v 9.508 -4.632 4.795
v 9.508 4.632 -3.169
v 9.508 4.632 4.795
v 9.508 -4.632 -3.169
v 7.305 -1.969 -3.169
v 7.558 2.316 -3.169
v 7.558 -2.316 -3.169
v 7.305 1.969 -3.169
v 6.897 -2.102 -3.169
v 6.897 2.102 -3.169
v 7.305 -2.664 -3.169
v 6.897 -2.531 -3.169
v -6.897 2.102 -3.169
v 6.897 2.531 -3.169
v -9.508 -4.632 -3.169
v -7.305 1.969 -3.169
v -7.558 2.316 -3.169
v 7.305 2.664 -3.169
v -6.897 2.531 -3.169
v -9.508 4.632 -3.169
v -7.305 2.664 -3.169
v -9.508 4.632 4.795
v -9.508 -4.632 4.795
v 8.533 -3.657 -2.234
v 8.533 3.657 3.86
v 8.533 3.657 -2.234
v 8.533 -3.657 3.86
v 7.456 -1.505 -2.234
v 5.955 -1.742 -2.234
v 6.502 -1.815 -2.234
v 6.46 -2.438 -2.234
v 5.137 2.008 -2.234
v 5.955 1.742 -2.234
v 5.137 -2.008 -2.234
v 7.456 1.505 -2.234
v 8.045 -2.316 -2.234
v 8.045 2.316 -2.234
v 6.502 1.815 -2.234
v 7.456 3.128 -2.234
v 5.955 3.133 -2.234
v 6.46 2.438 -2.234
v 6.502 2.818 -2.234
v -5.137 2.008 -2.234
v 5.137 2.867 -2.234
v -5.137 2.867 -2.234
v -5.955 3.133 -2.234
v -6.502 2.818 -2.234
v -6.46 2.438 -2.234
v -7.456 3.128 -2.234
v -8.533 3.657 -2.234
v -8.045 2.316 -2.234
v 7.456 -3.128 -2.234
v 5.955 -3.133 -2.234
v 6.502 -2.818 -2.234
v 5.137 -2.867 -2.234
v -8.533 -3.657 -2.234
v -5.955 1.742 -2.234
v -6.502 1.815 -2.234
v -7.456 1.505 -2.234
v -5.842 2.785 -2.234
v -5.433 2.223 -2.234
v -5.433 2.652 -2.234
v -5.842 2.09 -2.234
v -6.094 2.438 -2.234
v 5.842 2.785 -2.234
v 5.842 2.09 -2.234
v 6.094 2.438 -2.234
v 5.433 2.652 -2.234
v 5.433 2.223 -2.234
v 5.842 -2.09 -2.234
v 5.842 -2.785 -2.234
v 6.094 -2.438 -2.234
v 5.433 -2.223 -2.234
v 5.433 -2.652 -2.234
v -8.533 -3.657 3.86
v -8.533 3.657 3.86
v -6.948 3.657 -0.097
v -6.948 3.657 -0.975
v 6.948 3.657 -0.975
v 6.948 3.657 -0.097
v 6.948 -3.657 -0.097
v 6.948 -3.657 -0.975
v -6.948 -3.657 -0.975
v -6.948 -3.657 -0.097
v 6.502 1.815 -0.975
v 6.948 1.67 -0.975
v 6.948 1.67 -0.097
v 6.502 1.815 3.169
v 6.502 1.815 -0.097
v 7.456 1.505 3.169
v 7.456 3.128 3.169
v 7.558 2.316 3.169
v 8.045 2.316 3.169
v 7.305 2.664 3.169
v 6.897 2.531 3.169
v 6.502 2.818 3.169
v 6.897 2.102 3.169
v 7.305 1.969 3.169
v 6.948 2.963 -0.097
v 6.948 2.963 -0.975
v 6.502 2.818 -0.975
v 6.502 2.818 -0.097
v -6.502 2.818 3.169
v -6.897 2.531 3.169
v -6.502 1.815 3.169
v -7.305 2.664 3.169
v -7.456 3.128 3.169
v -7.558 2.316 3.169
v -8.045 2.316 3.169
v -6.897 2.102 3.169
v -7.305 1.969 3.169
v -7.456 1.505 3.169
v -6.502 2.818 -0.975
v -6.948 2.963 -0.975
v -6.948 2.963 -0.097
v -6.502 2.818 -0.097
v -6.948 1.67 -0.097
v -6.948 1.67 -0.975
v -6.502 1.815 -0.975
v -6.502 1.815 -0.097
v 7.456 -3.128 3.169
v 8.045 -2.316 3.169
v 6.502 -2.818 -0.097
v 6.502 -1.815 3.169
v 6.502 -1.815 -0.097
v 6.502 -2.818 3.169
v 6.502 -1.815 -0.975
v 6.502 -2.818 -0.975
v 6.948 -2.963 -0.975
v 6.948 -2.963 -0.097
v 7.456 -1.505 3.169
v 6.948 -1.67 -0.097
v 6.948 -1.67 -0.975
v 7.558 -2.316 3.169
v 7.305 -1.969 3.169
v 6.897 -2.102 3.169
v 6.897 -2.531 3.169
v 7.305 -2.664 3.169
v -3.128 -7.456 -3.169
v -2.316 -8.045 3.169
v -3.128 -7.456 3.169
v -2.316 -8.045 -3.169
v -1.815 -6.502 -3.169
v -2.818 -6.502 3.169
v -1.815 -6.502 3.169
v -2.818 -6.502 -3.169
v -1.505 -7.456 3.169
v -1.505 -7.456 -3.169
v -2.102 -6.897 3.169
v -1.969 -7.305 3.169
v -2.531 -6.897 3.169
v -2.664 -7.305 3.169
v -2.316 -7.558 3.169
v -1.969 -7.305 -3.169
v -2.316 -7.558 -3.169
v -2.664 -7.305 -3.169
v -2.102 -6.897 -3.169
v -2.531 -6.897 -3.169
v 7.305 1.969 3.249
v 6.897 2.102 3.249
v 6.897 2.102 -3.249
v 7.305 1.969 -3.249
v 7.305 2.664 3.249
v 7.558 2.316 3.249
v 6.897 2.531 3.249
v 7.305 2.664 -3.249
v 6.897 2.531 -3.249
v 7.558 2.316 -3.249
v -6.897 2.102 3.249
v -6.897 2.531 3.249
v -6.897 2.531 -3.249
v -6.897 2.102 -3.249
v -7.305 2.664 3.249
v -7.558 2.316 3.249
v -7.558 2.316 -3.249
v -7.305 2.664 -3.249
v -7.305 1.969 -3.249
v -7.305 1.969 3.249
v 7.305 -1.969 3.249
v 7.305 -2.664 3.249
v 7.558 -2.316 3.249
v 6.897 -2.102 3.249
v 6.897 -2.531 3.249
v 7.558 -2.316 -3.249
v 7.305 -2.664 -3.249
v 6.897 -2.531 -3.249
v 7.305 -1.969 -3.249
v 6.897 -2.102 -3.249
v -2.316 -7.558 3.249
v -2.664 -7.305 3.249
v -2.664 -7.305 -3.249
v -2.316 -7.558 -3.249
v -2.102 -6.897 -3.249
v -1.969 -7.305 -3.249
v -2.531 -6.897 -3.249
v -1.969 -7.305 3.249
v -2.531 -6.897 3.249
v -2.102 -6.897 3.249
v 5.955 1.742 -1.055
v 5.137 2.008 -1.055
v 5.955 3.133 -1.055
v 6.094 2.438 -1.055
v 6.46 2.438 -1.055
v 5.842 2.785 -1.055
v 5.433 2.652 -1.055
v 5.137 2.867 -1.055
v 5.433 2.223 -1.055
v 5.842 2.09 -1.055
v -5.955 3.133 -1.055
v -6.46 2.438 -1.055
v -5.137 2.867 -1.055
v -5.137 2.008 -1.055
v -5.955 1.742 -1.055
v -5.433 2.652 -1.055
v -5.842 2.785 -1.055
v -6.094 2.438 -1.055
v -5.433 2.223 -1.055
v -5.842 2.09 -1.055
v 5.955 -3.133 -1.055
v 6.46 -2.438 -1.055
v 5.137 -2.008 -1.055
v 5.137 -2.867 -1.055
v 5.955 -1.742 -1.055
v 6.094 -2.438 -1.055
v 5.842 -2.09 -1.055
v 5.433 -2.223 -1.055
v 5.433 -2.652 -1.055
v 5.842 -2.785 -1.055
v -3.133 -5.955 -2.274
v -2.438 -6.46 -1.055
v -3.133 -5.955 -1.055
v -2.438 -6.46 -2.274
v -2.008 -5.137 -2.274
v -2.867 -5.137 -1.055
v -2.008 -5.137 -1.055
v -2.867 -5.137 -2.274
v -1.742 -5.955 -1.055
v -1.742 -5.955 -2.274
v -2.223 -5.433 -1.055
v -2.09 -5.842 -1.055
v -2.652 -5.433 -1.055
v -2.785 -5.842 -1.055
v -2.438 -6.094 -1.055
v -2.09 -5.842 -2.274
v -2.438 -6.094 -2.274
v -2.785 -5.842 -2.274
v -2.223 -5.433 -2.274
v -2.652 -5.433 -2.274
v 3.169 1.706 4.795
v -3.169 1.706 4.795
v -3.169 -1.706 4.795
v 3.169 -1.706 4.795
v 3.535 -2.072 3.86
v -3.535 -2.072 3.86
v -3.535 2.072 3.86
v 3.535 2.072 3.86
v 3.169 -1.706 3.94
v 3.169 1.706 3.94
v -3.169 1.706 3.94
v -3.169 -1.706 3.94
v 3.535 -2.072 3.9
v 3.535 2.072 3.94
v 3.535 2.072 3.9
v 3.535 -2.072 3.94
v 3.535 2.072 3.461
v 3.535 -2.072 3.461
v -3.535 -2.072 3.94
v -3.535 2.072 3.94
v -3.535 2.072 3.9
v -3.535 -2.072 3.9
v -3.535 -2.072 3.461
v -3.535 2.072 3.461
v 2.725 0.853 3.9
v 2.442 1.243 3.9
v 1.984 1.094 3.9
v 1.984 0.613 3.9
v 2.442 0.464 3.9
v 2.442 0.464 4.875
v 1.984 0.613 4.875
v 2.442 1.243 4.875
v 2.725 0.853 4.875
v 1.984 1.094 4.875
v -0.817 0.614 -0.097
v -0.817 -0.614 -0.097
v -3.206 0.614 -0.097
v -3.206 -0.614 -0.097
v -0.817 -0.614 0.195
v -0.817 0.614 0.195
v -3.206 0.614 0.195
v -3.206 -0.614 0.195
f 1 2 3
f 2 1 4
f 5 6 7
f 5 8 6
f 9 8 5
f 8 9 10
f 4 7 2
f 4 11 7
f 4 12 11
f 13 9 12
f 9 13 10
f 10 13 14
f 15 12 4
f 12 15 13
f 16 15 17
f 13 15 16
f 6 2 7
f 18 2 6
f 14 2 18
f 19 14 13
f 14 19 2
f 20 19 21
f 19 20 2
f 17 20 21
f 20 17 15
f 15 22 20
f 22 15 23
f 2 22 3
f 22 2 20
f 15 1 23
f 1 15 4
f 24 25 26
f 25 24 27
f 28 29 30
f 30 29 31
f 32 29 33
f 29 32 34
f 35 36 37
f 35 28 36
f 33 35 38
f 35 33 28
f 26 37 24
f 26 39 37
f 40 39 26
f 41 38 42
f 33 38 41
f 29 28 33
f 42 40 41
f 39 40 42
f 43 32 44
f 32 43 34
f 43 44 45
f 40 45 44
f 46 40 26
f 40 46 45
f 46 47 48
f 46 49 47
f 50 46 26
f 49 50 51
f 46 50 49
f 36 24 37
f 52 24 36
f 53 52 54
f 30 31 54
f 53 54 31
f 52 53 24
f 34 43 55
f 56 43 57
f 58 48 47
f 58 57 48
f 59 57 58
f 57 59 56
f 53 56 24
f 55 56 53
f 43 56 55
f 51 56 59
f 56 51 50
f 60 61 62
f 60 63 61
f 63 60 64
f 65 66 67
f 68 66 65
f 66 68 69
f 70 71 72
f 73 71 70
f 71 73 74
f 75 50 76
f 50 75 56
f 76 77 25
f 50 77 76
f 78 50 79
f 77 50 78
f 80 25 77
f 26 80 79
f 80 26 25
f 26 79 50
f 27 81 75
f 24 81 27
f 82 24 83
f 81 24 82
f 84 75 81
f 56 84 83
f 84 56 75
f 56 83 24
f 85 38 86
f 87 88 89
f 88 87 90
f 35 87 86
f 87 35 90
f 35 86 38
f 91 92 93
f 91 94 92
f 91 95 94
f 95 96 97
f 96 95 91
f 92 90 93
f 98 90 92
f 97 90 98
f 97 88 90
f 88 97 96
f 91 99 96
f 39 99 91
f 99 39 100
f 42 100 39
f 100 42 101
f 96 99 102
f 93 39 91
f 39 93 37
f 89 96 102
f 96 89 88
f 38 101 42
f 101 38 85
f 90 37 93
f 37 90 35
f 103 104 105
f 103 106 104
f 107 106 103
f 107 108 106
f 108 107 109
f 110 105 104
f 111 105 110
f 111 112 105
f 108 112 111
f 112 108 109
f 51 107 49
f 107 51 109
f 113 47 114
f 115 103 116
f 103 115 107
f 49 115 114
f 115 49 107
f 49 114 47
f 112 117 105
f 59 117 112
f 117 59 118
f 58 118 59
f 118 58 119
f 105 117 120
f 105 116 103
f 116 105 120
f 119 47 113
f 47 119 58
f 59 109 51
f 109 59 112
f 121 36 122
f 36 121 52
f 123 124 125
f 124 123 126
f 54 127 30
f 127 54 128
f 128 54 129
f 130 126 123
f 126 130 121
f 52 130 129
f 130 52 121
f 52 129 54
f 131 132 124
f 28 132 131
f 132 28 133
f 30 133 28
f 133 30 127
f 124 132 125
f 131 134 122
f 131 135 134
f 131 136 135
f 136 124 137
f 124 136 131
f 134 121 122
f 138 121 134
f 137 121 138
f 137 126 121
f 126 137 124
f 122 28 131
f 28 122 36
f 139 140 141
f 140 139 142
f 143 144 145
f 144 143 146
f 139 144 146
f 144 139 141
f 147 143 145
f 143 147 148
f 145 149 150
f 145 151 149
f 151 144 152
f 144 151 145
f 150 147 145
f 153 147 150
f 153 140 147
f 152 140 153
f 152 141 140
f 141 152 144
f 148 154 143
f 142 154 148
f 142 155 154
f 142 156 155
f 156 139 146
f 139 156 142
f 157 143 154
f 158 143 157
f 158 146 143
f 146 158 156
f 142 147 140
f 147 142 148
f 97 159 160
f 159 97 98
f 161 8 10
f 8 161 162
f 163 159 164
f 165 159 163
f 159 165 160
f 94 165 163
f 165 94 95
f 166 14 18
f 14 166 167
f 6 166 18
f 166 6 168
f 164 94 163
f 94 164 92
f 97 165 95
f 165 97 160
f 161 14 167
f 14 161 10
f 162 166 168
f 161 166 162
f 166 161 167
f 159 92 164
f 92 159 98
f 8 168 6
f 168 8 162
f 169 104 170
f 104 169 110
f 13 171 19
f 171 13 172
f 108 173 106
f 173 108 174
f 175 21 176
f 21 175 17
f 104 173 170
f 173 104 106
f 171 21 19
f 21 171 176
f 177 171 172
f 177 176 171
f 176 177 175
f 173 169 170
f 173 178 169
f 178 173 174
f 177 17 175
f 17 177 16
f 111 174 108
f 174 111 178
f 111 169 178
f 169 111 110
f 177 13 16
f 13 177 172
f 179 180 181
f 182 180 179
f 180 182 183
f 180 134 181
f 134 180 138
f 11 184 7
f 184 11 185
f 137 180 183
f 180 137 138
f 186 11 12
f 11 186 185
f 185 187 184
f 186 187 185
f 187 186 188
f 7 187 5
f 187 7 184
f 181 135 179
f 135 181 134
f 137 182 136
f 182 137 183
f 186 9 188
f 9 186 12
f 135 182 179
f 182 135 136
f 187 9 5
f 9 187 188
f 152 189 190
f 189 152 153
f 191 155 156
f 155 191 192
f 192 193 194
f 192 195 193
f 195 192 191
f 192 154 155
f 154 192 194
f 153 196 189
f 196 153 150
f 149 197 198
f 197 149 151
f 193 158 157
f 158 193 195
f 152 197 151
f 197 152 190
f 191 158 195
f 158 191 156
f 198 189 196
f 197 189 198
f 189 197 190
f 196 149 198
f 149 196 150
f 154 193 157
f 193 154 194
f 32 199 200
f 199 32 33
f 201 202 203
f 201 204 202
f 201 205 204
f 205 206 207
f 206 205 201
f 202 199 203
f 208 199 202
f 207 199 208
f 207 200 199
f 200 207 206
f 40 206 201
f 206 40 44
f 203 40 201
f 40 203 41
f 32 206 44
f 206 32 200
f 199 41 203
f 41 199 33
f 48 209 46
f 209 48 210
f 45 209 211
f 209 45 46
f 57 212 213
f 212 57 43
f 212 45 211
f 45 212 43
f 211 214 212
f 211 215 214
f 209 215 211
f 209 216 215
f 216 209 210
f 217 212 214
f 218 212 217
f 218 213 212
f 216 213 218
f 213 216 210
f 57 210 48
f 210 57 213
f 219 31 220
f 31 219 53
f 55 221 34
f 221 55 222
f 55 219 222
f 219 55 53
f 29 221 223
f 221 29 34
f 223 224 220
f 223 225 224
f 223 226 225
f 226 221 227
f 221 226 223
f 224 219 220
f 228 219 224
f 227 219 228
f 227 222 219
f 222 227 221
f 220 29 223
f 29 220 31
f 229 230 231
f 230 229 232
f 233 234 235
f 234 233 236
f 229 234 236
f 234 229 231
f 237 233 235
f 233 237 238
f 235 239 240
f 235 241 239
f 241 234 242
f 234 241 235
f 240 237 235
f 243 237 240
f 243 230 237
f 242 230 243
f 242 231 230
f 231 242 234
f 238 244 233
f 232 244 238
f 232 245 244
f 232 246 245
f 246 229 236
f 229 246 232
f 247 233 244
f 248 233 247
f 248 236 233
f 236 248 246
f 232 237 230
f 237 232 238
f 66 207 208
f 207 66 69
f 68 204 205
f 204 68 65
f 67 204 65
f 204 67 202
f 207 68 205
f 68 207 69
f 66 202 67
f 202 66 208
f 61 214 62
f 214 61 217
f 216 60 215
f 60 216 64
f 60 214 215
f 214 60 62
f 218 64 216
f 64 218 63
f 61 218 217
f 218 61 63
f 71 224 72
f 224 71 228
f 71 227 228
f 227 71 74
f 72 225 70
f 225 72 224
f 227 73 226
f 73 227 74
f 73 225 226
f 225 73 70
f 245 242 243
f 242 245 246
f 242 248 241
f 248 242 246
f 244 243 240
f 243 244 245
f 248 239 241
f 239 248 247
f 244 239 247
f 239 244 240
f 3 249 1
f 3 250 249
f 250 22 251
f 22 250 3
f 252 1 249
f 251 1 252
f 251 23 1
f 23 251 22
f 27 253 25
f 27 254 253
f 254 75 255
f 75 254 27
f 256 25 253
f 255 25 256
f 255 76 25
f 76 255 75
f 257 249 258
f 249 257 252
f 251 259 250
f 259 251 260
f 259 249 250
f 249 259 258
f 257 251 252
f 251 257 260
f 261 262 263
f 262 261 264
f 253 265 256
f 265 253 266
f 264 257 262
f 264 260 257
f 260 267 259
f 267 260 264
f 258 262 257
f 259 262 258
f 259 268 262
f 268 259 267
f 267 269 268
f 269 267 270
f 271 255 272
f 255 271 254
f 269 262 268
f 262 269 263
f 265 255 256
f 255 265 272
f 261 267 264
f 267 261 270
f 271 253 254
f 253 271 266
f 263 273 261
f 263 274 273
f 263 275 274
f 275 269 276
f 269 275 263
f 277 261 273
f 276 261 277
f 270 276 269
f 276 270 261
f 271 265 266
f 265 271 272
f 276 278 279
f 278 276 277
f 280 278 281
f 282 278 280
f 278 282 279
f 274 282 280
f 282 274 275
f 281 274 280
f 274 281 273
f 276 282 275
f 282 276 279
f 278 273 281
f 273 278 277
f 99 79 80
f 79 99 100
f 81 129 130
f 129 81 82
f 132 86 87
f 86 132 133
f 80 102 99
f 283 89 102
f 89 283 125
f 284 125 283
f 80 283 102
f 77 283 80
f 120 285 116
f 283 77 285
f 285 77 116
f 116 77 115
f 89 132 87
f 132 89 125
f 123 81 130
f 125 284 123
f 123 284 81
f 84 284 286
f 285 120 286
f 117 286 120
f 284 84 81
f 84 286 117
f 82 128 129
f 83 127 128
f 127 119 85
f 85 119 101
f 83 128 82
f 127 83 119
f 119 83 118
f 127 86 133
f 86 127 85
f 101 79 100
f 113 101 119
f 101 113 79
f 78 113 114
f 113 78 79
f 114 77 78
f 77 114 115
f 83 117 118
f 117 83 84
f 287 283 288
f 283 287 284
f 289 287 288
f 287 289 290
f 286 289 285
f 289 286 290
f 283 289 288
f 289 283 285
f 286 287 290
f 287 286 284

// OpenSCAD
// Parameters
total_length = 24.384; //[12.192:48.768:0.1]
wall_thickness = 0.975; //[0.5:2.0:0.05]
lid_thickness = 0.975; //[0.5:2.0:0.05]
base_inner_length = 17.066; //[8.5:34.0:0.1]
base_inner_width = 7.314; //[3.5:15.0:0.1]
base_inner_height = 5.363; //[2.5:11.0:0.1]
lid_lip_height = 0.731; //[0.3:1.6:0.05]
lid_lip_clearance = 0.073; //[0.02:0.2:0.01]
print_clearance_general = 0.073; //[0.02:0.2:0.01]
fastener_boss_outer_diameter = 1.706; //[0.9:3.5:0.05]
fastener_hole_diameter = 0.731; //[0.4:1.6:0.05]
standoff_height = 1.219; //[0.6:2.6:0.05]
standoff_outer_diameter = 1.463; //[0.7:3.0:0.05]
standoff_hole_diameter = 0.731; //[0.4:1.6:0.05]
usb_cutout_width = 2.925; //[1.2:6.0:0.05]
usb_cutout_height = 1.463; //[0.6:3.0:0.05]
display_window_width = 6.338; //[3.0:13.0:0.05]
display_window_height = 3.413; //[1.5:7.0:0.05]
display_window_bezel = 0.366; //[0.1:1.0:0.02]
display_pcb_clearance_depth = 0.731; //[0.3:1.6:0.05]
pcb_length = 13.409; //[6.5:27.0:0.1]
pcb_width = 6.826; //[3.0:14.0:0.1]
pcb_thickness = 0.39; //[0.2:1.0:0.01]
pcb_clearance_xy = 0.244; //[0.1:0.6:0.01]
pcb_clearance_z = 0.488; //[0.2:1.2:0.02]
overlap = 0.08; //[0.02:0.2:0.01]

// Base Enclosure
module enclosure_base_outer() {
  cube([base_inner_length + 2*wall_thickness, base_inner_width + 2*wall_thickness, base_inner_height + wall_thickness], center=true);
}

module enclosure_base_inner_void() {
  translate([0, 0, wall_thickness/2])
    cube([base_inner_length, base_inner_width, base_inner_height + overlap], center=true);
}

module fastener_boss_cyl() {
  cylinder(r=fastener_boss_outer_diameter/2, h=base_inner_height + wall_thickness, center=true);
}

module fastener_hole_cyl() {
  cylinder(r=fastener_hole_diameter/2, h=base_inner_height + wall_thickness + 2*overlap, center=true);
}

module standoff_cyl() {
  cylinder(r=standoff_outer_diameter/2, h=standoff_height, center=true);
}

module standoff_hole_cyl() {
  cylinder(r=standoff_hole_diameter/2, h=standoff_height + 2*overlap, center=true);
}

module usb_access_cutout() {
  translate([base_inner_length/2 + wall_thickness/2, 0, -(base_inner_height + wall_thickness)/2 + wall_thickness + usb_cutout_height/2])
    cube([wall_thickness + 2*overlap, usb_cutout_width + 2*print_clearance_general, usb_cutout_height + 2*print_clearance_general], center=true);
}

module side_clearance_cutouts() {
  translate([0, base_inner_width/2 + wall_thickness/2, 0])
    cube([base_inner_length*0.35, wall_thickness + 2*overlap, base_inner_height*0.35], center=true);
}

module internal_board_clearance_volume() {
  translate([0, 0, -(base_inner_height + wall_thickness)/2 + wall_thickness + standoff_height + (pcb_thickness + pcb_clearance_z)/2])
    cube([pcb_length + 2*pcb_clearance_xy, pcb_width + 2*pcb_clearance_xy, pcb_thickness + pcb_clearance_z], center=true);
}

// Lid Enclosure
module enclosure_lid_outer() {
  translate([0, 0, (base_inner_height + wall_thickness)/2 + (lid_thickness + lid_lip_height)/2 - overlap])
    cube([base_inner_length + 2*wall_thickness, base_inner_width + 2*wall_thickness, lid_thickness + lid_lip_height], center=true);
}

module enclosure_lid_underside_void() {
  translate([0, 0, (base_inner_height + wall_thickness)/2 + (lid_thickness + lid_lip_height)/2 - overlap - lid_thickness/2])
    cube([base_inner_length + 2*wall_thickness - 2*wall_thickness, base_inner_width + 2*wall_thickness - 2*wall_thickness, lid_lip_height + overlap], center=true);
}

module lid_lip_solid() {
  translate([0, 0, (base_inner_height + wall_thickness)/2 + lid_lip_height/2 - overlap])
    cube([base_inner_length - 2*lid_lip_clearance, base_inner_width - 2*lid_lip_clearance, lid_lip_height], center=true);
}

module display_window_cutout() {
  translate([0, 0, (base_inner_height + wall_thickness)/2 + (lid_thickness + lid_lip_height) - lid_thickness/2])
    cube([display_window_width, display_window_height, lid_thickness + 2*overlap], center=true);
}

module display_pocket_cutout() {
  translate([0, 0, (base_inner_height + wall_thickness)/2 + lid_lip_height - display_pcb_clearance_depth/2])
    cube([display_window_width + 2*display_window_bezel, display_window_height + 2*display_window_bezel, display_pcb_clearance_depth + overlap], center=true);
}

module display() {
  translate([0, 0, (base_inner_height + wall_thickness)/2 + lid_lip_height - display_pcb_clearance_depth*0.3])
    cube([display_window_width + 2*display_window_bezel, display_window_height + 2*display_window_bezel, display_pcb_clearance_depth*0.6], center=true);
}

module led() {
  translate([display_window_width/2 - display_window_height*0.25, display_window_height/2 - display_window_height*0.25, (base_inner_height + wall_thickness)/2 + (lid_thickness + lid_lip_height) - lid_thickness/2])
    cylinder(r=display_window_height*0.12, h=lid_thickness, center=true);
}

module box_header() {
  translate([-pcb_length*0.15, 0, -(base_inner_height + wall_thickness)/2 + wall_thickness + standoff_height + pcb_thickness + (pcb_thickness*2)/2])
    cube([pcb_width*0.35, pcb_width*0.18, pcb_thickness*2], center=true);
}

// Assembly
module enclosure_assembly() {
  union() {
    // Base
    difference() {
      enclosure_base_outer();
      enclosure_base_inner_void();
    }
    // Fastener Bosses
    union() {
      translate([base_inner_length/2 - fastener_boss_outer_diameter/2 - wall_thickness/2, base_inner_width/2 - fastener_boss_outer_diameter/2 - wall_thickness/2, 0])
        fastener_boss_cyl();
      mirror([1, 0, 0])
        translate([base_inner_length/2 - fastener_boss_outer_diameter/2 - wall_thickness/2, base_inner_width/2 - fastener_boss_outer_diameter/2 - wall_thickness/2, 0])
        fastener_boss_cyl();
      mirror([0, 1, 0])
        translate([base_inner_length/2 - fastener_boss_outer_diameter/2 - wall_thickness/2, base_inner_width/2 - fastener_boss_outer_diameter/2 - wall_thickness/2, 0])
        fastener_boss_cyl();
      mirror([1, 1, 0])
        translate([base_inner_length/2 - fastener_boss_outer_diameter/2 - wall_thickness/2, base_inner_width/2 - fastener_boss_outer_diameter/2 - wall_thickness/2, 0])
        fastener_boss_cyl();
    }
    // Fastener Holes
    difference() {
      union() {
        translate([base_inner_length/2 - fastener_boss_outer_diameter/2 - wall_thickness/2, base_inner_width/2 - fastener_boss_outer_diameter/2 - wall_thickness/2, 0])
          fastener_hole_cyl();
        mirror([1, 0, 0])
          translate([base_inner_length/2 - fastener_boss_outer_diameter/2 - wall_thickness/2, base_inner_width/2 - fastener_boss_outer_diameter/2 - wall_thickness/2, 0])
          fastener_hole_cyl();
        mirror([0, 1, 0])
          translate([base_inner_length/2 - fastener_boss_outer_diameter/2 - wall_thickness/2, base_inner_width/2 - fastener_boss_outer_diameter/2 - wall_thickness/2, 0])
          fastener_hole_cyl();
        mirror([1, 1, 0])
          translate([base_inner_length/2 - fastener_boss_outer_diameter/2 - wall_thickness/2, base_inner_width/2 - fastener_boss_outer_diameter/2 - wall_thickness/2, 0])
          fastener_hole_cyl();
      }
      usb_access_cutout();
      side_clearance_cutouts();
    }
    // PCB Mounting Standoffs
    difference() {
      union() {
        translate([pcb_length/2 - standoff_outer_diameter/2 - pcb_clearance_xy, pcb_width/2 - standoff_outer_diameter/2 - pcb_clearance_xy, -(base_inner_height + wall_thickness)/2 + wall_thickness + standoff_height/2 - overlap])
          standoff_cyl();
        mirror([1, 0, 0])
          translate([pcb_length/2 - standoff_outer_diameter/2 - pcb_clearance_xy, pcb_width/2 - standoff_outer_diameter/2 - pcb_clearance_xy, -(base_inner_height + wall_thickness)/2 + wall_thickness + standoff_height/2 - overlap])
          standoff_cyl();
        mirror([0, 1, 0])
          translate([pcb_length/2 - standoff_outer_diameter/2 - pcb_clearance_xy, pcb_width/2 - standoff_outer_diameter/2 - pcb_clearance_xy, -(base_inner_height + wall_thickness)/2 + wall_thickness + standoff_height/2 - overlap])
          standoff_cyl();
        mirror([1, 1, 0])
          translate([pcb_length/2 - standoff_outer_diameter/2 - pcb_clearance_xy, pcb_width/2 - standoff_outer_diameter/2 - pcb_clearance_xy, -(base_inner_height + wall_thickness)/2 + wall_thickness + standoff_height/2 - overlap])
          standoff_cyl();
      }
      union() {
        translate([pcb_length/2 - standoff_outer_diameter/2 - pcb_clearance_xy, pcb_width/2 - standoff_outer_diameter/2 - pcb_clearance_xy, -(base_inner_height + wall_thickness)/2 + wall_thickness + standoff_height/2 - overlap])
          standoff_hole_cyl();
        mirror([1, 0, 0])
          translate([pcb_length/2 - standoff_outer_diameter/2 - pcb_clearance_xy, pcb_width/2 - standoff_outer_diameter/2 - pcb_clearance_xy, -(base_inner_height + wall_thickness)/2 + wall_thickness + standoff_height/2 - overlap])
          standoff_hole_cyl();
        mirror([0, 1, 0])
          translate([pcb_length/2 - standoff_outer_diameter/2 - pcb_clearance_xy, pcb_width/2 - standoff_outer_diameter/2 - pcb_clearance_xy, -(base_inner_height + wall_thickness)/2 + wall_thickness + standoff_height/2 - overlap])
          standoff_hole_cyl();
        mirror([1, 1, 0])
          translate([pcb_length/2 - standoff_outer_diameter/2 - pcb_clearance_xy, pcb_width/2 - standoff_outer_diameter/2 - pcb_clearance_xy, -(base_inner_height + wall_thickness)/2 + wall_thickness + standoff_height/2 - overlap])
          standoff_hole_cyl();
      }
    }
    // Lid
    difference() {
      union() {
        enclosure_lid_outer();
        lid_lip_solid();
      }
      enclosure_lid_underside_void();
      display_window_cutout();
      display_pocket_cutout();
    }
    // Display and LED
    display();
    led();
    // Internal Board Clearance and Header
    internal_board_clearance_volume();
    box_header();
  }
}

// Final Output
enclosure_assembly();
